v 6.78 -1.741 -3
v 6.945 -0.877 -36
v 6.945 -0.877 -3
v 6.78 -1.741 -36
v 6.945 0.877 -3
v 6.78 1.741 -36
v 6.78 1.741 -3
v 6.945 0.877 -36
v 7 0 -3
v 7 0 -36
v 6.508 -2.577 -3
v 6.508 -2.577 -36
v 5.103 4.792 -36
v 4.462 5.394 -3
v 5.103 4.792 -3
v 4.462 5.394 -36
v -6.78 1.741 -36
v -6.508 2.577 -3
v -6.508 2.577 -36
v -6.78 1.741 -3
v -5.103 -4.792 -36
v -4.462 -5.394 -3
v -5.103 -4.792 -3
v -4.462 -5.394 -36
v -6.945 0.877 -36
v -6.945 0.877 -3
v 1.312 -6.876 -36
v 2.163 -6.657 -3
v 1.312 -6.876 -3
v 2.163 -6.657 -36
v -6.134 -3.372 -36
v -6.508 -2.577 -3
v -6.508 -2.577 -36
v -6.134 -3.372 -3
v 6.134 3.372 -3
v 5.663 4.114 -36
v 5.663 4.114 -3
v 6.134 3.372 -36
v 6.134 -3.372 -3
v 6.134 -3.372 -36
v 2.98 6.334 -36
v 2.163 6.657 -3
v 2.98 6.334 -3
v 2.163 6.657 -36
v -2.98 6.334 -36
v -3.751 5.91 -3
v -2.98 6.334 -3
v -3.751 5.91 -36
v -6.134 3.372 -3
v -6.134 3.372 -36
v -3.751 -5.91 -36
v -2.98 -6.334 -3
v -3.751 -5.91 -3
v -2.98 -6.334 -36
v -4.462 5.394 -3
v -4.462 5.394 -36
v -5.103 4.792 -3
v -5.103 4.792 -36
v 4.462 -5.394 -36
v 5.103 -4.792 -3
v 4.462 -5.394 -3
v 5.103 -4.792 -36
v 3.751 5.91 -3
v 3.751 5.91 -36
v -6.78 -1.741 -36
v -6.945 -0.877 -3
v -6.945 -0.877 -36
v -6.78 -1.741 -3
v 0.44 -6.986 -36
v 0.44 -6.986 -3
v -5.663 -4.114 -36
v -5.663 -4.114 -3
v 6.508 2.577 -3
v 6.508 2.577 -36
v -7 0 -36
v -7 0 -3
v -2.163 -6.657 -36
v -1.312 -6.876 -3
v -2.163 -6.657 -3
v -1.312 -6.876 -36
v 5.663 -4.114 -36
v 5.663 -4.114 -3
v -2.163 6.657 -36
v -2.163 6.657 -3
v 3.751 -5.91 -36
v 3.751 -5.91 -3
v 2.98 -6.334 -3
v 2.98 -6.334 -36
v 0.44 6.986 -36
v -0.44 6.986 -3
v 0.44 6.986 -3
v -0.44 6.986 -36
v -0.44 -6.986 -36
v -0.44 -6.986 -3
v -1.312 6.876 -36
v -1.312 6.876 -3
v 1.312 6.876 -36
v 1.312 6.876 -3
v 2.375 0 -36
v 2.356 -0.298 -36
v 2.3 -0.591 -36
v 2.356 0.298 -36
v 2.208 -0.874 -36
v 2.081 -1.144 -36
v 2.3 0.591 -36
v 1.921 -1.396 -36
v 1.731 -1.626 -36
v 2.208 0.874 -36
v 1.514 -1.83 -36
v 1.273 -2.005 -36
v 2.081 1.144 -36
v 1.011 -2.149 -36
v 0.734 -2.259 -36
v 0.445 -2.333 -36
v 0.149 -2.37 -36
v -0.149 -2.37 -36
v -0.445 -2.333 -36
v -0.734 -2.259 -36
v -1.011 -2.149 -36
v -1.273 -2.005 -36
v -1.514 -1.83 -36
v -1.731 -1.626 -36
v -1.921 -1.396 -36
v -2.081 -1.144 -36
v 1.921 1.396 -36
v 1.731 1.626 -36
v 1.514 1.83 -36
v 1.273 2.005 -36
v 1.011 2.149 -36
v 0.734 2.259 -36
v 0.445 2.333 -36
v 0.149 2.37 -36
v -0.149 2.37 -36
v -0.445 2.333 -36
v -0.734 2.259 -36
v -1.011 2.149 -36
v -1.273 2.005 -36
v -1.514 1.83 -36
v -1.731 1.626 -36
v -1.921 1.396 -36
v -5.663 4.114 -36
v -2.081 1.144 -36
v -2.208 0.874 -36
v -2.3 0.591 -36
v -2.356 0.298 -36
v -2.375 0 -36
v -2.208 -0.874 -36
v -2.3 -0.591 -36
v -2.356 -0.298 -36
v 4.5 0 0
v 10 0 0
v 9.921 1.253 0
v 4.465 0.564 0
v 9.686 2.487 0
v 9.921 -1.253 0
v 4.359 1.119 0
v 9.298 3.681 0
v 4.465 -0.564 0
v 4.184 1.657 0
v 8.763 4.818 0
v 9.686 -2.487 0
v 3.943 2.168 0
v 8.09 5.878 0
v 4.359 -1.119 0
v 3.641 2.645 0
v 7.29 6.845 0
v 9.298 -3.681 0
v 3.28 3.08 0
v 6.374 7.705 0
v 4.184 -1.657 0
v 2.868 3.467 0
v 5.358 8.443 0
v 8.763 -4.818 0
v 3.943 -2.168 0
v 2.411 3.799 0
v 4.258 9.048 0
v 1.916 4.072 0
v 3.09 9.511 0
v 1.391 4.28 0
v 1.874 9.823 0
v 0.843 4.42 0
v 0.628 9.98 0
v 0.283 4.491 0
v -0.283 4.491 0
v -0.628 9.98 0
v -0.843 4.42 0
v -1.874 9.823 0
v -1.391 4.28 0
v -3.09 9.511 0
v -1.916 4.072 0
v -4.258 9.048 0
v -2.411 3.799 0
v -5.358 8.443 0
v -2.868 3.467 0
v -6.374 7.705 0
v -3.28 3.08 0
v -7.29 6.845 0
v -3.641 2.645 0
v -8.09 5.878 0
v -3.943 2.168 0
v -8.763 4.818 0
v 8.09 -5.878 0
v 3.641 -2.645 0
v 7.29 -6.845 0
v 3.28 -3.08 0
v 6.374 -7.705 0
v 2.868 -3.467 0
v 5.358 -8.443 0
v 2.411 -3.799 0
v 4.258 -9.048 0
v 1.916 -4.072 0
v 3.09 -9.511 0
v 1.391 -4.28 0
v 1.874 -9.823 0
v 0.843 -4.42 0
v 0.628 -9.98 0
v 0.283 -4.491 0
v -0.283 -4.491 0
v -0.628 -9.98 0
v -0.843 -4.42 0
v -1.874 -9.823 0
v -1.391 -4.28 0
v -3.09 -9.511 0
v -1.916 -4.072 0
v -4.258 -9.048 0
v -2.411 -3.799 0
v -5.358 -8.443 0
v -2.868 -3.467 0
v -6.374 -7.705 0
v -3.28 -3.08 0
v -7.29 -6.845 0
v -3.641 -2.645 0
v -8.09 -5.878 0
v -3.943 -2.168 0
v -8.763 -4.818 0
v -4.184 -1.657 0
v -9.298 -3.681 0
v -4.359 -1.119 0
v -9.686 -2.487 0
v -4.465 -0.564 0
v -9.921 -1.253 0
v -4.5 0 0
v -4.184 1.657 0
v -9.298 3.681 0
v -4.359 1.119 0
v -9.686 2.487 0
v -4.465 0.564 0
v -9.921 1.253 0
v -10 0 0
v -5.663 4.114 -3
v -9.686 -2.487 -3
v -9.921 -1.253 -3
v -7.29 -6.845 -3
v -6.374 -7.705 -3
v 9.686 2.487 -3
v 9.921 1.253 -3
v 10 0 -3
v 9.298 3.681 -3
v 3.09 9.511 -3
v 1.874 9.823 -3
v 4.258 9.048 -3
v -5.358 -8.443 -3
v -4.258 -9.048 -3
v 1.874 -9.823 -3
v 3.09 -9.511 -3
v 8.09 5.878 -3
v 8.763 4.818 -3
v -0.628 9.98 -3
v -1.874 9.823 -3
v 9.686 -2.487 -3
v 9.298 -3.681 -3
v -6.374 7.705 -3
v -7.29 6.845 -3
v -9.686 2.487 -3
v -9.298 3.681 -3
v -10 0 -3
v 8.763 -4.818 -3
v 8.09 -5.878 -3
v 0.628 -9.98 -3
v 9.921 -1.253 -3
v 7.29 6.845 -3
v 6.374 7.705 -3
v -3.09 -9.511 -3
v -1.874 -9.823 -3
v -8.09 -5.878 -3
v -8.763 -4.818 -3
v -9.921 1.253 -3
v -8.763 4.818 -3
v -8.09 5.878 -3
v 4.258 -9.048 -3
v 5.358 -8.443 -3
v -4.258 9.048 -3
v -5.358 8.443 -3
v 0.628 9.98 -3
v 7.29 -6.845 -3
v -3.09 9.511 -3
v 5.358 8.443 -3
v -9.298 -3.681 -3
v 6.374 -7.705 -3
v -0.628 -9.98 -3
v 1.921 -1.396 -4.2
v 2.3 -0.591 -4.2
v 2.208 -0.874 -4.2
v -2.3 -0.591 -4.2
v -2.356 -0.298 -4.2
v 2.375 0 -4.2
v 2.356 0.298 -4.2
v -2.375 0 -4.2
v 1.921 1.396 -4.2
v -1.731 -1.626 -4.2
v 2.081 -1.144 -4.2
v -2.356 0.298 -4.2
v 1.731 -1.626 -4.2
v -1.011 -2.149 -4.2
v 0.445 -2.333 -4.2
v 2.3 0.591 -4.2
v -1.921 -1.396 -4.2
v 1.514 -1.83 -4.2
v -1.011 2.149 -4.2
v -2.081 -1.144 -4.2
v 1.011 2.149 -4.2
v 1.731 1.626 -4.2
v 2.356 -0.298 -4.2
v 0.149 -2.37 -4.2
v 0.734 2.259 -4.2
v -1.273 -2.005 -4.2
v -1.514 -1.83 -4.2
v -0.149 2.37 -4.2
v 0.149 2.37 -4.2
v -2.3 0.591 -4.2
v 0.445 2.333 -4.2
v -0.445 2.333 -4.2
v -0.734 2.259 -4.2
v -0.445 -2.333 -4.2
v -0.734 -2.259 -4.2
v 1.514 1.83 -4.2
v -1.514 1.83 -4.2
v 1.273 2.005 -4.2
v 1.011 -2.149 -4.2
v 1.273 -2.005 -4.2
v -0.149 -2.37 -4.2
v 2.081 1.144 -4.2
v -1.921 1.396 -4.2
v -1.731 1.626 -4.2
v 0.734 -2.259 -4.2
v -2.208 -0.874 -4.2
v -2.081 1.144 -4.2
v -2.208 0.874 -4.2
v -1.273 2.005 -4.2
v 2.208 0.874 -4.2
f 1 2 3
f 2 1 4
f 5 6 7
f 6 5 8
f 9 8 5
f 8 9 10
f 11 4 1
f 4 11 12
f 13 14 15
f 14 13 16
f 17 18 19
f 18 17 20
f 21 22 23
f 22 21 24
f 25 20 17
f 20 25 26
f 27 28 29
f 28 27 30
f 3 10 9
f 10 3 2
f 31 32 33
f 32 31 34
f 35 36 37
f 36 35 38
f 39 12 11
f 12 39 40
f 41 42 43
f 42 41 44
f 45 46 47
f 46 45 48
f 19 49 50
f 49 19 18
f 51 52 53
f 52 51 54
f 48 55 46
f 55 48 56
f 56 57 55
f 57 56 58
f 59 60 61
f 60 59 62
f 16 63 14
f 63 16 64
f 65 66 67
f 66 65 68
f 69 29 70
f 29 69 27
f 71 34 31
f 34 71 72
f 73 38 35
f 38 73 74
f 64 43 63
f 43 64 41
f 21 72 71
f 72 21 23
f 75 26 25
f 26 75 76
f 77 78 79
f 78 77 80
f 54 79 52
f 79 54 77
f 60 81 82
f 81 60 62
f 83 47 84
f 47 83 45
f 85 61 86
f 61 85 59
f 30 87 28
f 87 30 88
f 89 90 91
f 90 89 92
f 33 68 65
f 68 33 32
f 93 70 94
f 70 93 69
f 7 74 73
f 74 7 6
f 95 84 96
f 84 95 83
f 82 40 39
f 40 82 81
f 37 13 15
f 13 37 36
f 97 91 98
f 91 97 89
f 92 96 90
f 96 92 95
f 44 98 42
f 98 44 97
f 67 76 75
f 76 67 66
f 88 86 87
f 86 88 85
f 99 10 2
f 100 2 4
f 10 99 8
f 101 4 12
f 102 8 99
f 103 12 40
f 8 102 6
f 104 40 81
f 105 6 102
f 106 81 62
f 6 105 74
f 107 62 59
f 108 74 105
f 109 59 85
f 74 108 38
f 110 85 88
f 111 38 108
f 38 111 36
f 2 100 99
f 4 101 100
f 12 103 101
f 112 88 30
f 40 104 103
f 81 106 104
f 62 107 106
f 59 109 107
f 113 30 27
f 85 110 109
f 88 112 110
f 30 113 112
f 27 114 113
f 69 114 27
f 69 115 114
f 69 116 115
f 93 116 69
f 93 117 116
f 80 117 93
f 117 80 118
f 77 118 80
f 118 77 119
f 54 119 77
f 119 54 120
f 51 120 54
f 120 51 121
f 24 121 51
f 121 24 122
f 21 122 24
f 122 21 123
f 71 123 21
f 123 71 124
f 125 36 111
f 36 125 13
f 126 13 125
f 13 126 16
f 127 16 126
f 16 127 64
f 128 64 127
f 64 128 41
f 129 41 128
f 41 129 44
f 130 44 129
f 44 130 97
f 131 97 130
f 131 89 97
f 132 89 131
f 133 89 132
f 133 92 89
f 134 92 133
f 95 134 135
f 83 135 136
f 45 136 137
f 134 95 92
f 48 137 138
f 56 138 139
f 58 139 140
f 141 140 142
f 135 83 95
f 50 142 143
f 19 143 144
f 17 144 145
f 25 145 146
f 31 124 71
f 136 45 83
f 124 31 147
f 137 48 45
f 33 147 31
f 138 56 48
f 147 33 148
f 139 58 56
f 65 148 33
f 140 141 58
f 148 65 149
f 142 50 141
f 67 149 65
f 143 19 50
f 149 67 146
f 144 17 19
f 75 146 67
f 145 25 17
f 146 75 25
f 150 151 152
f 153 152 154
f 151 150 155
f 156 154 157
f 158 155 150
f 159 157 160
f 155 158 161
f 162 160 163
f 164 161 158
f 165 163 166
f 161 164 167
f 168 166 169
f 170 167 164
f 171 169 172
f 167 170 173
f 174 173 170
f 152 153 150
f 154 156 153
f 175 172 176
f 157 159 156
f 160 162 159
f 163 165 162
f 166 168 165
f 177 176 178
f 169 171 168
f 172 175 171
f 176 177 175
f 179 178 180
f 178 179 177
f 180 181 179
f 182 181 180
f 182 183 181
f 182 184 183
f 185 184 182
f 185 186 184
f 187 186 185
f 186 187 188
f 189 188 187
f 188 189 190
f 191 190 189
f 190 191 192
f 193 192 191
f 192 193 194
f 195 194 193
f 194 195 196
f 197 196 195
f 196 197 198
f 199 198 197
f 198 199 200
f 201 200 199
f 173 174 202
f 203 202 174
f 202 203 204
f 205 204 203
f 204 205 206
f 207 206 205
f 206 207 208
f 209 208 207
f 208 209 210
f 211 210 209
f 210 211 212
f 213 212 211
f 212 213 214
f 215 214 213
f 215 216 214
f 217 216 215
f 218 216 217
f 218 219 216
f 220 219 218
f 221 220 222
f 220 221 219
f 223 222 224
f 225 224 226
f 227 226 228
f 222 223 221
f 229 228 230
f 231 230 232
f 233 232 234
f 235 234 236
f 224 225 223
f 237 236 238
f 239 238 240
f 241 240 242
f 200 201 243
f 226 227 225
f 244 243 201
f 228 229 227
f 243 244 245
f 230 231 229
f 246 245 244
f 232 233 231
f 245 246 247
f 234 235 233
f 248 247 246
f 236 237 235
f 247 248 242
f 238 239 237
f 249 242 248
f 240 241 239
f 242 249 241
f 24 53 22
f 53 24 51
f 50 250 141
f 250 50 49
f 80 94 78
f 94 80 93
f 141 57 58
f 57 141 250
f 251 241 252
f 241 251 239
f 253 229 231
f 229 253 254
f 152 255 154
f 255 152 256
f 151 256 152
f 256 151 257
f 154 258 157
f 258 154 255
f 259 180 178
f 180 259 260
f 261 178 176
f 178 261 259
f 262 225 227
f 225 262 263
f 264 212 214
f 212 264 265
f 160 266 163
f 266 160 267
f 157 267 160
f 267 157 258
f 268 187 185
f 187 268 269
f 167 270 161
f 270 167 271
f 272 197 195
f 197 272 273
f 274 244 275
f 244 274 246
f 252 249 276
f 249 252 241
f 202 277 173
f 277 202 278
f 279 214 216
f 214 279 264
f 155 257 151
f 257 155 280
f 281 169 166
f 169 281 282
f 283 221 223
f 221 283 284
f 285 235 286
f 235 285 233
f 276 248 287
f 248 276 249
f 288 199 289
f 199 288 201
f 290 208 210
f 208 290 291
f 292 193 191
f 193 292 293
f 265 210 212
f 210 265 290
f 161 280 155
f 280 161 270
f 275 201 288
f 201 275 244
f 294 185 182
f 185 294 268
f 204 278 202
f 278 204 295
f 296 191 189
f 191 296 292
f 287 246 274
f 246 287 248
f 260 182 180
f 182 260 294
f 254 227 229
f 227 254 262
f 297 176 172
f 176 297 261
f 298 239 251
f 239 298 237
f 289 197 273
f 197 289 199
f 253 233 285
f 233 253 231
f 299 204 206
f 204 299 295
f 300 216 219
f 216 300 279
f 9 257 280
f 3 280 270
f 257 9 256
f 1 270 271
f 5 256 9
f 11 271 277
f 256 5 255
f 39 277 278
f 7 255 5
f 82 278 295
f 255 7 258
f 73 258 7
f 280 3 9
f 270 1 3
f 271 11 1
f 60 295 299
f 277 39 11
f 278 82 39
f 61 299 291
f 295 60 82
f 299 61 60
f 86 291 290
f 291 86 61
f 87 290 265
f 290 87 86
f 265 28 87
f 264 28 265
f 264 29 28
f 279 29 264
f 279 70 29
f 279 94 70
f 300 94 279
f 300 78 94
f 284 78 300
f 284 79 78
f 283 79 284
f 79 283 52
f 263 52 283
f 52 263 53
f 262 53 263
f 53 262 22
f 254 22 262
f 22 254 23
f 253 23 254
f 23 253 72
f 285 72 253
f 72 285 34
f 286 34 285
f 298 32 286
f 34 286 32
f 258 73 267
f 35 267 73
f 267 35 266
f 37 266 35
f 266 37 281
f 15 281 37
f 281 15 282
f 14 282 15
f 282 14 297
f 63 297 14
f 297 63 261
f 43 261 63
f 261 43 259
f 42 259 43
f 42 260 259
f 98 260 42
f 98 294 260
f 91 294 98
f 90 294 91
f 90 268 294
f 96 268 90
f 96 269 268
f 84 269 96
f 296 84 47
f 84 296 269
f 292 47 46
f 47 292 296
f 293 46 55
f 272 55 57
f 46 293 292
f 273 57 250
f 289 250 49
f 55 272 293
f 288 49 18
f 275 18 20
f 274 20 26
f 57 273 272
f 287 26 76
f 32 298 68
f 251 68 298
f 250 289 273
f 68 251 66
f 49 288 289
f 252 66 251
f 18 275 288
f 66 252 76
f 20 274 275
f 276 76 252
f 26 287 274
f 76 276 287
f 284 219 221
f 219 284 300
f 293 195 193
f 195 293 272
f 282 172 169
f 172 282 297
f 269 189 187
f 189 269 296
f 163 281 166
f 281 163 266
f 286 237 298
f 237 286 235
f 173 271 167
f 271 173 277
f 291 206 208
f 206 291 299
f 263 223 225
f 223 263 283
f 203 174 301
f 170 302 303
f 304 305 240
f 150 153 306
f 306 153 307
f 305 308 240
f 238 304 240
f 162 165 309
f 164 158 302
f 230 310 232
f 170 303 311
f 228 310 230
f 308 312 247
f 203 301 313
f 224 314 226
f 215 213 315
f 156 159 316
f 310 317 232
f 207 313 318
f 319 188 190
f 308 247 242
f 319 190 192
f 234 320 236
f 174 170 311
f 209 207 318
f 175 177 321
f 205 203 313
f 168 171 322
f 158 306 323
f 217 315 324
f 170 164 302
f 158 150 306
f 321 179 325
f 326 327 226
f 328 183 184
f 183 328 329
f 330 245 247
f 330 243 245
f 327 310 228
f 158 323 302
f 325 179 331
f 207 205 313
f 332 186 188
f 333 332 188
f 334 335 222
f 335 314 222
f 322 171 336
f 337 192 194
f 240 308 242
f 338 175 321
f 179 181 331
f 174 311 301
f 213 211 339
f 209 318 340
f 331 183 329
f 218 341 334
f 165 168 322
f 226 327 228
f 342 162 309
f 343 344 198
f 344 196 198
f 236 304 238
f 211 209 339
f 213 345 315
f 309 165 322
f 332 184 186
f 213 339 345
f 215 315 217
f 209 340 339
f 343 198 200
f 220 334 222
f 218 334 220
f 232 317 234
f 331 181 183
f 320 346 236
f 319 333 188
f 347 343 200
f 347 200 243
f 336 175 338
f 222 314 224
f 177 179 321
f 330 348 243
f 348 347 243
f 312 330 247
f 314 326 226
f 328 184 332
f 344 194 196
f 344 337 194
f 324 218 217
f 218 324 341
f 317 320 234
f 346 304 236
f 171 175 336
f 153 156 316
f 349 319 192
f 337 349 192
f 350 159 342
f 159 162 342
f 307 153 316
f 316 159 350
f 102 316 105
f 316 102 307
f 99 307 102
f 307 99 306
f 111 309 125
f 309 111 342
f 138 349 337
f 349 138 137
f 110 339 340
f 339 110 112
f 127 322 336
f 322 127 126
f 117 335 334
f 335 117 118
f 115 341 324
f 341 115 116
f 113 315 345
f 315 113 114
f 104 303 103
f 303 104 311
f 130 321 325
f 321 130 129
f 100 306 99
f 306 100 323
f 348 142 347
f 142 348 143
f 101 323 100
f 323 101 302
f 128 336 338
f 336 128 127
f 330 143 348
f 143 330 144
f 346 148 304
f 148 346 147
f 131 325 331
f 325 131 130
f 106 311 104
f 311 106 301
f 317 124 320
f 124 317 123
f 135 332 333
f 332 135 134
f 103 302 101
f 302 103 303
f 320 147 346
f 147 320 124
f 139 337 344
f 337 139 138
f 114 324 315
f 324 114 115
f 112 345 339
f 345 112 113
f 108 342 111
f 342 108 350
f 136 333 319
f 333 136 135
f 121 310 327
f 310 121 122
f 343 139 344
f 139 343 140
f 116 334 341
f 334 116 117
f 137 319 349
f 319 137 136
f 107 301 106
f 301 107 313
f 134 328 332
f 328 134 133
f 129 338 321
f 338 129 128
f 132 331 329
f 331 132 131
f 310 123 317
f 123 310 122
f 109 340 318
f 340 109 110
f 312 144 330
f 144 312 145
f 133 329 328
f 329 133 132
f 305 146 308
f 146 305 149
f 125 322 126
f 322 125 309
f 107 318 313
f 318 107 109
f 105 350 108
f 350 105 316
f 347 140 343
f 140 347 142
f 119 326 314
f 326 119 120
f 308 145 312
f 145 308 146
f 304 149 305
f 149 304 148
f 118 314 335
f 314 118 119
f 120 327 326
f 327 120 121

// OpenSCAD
$fn = 50;


difference() {
	union() {
		translate(v = [0, 0, -36.0000000000]) {
			cylinder(h = 36, r = 7.0000000000);
		}
		translate(v = [0, 0, -3.0000000000]) {
			cylinder(h = 3, r = 10.0000000000);
		}
	}
	union() {
		translate(v = [0, 0, 0]) {
			rotate(a = [0, 0, 0]) {
				difference() {
					union() {
						#translate(v = [0, 0, -36.0000000000]) {
							cylinder(h = 36, r = 2.2500000000);
						}
						#translate(v = [0, 0, -4.2000000000]) {
							cylinder(h = 4.2000000000, r1 = 2.3750000000, r2 = 4.5000000000);
						}
						#translate(v = [0, 0, -36.0000000000]) {
							cylinder(h = 36, r = 2.3750000000);
						}
						#translate(v = [0, 0, -36.0000000000]) {
							cylinder(h = 36, r = 2.2500000000);
						}
					}
					union();
				}
			}
		}
	}
}
